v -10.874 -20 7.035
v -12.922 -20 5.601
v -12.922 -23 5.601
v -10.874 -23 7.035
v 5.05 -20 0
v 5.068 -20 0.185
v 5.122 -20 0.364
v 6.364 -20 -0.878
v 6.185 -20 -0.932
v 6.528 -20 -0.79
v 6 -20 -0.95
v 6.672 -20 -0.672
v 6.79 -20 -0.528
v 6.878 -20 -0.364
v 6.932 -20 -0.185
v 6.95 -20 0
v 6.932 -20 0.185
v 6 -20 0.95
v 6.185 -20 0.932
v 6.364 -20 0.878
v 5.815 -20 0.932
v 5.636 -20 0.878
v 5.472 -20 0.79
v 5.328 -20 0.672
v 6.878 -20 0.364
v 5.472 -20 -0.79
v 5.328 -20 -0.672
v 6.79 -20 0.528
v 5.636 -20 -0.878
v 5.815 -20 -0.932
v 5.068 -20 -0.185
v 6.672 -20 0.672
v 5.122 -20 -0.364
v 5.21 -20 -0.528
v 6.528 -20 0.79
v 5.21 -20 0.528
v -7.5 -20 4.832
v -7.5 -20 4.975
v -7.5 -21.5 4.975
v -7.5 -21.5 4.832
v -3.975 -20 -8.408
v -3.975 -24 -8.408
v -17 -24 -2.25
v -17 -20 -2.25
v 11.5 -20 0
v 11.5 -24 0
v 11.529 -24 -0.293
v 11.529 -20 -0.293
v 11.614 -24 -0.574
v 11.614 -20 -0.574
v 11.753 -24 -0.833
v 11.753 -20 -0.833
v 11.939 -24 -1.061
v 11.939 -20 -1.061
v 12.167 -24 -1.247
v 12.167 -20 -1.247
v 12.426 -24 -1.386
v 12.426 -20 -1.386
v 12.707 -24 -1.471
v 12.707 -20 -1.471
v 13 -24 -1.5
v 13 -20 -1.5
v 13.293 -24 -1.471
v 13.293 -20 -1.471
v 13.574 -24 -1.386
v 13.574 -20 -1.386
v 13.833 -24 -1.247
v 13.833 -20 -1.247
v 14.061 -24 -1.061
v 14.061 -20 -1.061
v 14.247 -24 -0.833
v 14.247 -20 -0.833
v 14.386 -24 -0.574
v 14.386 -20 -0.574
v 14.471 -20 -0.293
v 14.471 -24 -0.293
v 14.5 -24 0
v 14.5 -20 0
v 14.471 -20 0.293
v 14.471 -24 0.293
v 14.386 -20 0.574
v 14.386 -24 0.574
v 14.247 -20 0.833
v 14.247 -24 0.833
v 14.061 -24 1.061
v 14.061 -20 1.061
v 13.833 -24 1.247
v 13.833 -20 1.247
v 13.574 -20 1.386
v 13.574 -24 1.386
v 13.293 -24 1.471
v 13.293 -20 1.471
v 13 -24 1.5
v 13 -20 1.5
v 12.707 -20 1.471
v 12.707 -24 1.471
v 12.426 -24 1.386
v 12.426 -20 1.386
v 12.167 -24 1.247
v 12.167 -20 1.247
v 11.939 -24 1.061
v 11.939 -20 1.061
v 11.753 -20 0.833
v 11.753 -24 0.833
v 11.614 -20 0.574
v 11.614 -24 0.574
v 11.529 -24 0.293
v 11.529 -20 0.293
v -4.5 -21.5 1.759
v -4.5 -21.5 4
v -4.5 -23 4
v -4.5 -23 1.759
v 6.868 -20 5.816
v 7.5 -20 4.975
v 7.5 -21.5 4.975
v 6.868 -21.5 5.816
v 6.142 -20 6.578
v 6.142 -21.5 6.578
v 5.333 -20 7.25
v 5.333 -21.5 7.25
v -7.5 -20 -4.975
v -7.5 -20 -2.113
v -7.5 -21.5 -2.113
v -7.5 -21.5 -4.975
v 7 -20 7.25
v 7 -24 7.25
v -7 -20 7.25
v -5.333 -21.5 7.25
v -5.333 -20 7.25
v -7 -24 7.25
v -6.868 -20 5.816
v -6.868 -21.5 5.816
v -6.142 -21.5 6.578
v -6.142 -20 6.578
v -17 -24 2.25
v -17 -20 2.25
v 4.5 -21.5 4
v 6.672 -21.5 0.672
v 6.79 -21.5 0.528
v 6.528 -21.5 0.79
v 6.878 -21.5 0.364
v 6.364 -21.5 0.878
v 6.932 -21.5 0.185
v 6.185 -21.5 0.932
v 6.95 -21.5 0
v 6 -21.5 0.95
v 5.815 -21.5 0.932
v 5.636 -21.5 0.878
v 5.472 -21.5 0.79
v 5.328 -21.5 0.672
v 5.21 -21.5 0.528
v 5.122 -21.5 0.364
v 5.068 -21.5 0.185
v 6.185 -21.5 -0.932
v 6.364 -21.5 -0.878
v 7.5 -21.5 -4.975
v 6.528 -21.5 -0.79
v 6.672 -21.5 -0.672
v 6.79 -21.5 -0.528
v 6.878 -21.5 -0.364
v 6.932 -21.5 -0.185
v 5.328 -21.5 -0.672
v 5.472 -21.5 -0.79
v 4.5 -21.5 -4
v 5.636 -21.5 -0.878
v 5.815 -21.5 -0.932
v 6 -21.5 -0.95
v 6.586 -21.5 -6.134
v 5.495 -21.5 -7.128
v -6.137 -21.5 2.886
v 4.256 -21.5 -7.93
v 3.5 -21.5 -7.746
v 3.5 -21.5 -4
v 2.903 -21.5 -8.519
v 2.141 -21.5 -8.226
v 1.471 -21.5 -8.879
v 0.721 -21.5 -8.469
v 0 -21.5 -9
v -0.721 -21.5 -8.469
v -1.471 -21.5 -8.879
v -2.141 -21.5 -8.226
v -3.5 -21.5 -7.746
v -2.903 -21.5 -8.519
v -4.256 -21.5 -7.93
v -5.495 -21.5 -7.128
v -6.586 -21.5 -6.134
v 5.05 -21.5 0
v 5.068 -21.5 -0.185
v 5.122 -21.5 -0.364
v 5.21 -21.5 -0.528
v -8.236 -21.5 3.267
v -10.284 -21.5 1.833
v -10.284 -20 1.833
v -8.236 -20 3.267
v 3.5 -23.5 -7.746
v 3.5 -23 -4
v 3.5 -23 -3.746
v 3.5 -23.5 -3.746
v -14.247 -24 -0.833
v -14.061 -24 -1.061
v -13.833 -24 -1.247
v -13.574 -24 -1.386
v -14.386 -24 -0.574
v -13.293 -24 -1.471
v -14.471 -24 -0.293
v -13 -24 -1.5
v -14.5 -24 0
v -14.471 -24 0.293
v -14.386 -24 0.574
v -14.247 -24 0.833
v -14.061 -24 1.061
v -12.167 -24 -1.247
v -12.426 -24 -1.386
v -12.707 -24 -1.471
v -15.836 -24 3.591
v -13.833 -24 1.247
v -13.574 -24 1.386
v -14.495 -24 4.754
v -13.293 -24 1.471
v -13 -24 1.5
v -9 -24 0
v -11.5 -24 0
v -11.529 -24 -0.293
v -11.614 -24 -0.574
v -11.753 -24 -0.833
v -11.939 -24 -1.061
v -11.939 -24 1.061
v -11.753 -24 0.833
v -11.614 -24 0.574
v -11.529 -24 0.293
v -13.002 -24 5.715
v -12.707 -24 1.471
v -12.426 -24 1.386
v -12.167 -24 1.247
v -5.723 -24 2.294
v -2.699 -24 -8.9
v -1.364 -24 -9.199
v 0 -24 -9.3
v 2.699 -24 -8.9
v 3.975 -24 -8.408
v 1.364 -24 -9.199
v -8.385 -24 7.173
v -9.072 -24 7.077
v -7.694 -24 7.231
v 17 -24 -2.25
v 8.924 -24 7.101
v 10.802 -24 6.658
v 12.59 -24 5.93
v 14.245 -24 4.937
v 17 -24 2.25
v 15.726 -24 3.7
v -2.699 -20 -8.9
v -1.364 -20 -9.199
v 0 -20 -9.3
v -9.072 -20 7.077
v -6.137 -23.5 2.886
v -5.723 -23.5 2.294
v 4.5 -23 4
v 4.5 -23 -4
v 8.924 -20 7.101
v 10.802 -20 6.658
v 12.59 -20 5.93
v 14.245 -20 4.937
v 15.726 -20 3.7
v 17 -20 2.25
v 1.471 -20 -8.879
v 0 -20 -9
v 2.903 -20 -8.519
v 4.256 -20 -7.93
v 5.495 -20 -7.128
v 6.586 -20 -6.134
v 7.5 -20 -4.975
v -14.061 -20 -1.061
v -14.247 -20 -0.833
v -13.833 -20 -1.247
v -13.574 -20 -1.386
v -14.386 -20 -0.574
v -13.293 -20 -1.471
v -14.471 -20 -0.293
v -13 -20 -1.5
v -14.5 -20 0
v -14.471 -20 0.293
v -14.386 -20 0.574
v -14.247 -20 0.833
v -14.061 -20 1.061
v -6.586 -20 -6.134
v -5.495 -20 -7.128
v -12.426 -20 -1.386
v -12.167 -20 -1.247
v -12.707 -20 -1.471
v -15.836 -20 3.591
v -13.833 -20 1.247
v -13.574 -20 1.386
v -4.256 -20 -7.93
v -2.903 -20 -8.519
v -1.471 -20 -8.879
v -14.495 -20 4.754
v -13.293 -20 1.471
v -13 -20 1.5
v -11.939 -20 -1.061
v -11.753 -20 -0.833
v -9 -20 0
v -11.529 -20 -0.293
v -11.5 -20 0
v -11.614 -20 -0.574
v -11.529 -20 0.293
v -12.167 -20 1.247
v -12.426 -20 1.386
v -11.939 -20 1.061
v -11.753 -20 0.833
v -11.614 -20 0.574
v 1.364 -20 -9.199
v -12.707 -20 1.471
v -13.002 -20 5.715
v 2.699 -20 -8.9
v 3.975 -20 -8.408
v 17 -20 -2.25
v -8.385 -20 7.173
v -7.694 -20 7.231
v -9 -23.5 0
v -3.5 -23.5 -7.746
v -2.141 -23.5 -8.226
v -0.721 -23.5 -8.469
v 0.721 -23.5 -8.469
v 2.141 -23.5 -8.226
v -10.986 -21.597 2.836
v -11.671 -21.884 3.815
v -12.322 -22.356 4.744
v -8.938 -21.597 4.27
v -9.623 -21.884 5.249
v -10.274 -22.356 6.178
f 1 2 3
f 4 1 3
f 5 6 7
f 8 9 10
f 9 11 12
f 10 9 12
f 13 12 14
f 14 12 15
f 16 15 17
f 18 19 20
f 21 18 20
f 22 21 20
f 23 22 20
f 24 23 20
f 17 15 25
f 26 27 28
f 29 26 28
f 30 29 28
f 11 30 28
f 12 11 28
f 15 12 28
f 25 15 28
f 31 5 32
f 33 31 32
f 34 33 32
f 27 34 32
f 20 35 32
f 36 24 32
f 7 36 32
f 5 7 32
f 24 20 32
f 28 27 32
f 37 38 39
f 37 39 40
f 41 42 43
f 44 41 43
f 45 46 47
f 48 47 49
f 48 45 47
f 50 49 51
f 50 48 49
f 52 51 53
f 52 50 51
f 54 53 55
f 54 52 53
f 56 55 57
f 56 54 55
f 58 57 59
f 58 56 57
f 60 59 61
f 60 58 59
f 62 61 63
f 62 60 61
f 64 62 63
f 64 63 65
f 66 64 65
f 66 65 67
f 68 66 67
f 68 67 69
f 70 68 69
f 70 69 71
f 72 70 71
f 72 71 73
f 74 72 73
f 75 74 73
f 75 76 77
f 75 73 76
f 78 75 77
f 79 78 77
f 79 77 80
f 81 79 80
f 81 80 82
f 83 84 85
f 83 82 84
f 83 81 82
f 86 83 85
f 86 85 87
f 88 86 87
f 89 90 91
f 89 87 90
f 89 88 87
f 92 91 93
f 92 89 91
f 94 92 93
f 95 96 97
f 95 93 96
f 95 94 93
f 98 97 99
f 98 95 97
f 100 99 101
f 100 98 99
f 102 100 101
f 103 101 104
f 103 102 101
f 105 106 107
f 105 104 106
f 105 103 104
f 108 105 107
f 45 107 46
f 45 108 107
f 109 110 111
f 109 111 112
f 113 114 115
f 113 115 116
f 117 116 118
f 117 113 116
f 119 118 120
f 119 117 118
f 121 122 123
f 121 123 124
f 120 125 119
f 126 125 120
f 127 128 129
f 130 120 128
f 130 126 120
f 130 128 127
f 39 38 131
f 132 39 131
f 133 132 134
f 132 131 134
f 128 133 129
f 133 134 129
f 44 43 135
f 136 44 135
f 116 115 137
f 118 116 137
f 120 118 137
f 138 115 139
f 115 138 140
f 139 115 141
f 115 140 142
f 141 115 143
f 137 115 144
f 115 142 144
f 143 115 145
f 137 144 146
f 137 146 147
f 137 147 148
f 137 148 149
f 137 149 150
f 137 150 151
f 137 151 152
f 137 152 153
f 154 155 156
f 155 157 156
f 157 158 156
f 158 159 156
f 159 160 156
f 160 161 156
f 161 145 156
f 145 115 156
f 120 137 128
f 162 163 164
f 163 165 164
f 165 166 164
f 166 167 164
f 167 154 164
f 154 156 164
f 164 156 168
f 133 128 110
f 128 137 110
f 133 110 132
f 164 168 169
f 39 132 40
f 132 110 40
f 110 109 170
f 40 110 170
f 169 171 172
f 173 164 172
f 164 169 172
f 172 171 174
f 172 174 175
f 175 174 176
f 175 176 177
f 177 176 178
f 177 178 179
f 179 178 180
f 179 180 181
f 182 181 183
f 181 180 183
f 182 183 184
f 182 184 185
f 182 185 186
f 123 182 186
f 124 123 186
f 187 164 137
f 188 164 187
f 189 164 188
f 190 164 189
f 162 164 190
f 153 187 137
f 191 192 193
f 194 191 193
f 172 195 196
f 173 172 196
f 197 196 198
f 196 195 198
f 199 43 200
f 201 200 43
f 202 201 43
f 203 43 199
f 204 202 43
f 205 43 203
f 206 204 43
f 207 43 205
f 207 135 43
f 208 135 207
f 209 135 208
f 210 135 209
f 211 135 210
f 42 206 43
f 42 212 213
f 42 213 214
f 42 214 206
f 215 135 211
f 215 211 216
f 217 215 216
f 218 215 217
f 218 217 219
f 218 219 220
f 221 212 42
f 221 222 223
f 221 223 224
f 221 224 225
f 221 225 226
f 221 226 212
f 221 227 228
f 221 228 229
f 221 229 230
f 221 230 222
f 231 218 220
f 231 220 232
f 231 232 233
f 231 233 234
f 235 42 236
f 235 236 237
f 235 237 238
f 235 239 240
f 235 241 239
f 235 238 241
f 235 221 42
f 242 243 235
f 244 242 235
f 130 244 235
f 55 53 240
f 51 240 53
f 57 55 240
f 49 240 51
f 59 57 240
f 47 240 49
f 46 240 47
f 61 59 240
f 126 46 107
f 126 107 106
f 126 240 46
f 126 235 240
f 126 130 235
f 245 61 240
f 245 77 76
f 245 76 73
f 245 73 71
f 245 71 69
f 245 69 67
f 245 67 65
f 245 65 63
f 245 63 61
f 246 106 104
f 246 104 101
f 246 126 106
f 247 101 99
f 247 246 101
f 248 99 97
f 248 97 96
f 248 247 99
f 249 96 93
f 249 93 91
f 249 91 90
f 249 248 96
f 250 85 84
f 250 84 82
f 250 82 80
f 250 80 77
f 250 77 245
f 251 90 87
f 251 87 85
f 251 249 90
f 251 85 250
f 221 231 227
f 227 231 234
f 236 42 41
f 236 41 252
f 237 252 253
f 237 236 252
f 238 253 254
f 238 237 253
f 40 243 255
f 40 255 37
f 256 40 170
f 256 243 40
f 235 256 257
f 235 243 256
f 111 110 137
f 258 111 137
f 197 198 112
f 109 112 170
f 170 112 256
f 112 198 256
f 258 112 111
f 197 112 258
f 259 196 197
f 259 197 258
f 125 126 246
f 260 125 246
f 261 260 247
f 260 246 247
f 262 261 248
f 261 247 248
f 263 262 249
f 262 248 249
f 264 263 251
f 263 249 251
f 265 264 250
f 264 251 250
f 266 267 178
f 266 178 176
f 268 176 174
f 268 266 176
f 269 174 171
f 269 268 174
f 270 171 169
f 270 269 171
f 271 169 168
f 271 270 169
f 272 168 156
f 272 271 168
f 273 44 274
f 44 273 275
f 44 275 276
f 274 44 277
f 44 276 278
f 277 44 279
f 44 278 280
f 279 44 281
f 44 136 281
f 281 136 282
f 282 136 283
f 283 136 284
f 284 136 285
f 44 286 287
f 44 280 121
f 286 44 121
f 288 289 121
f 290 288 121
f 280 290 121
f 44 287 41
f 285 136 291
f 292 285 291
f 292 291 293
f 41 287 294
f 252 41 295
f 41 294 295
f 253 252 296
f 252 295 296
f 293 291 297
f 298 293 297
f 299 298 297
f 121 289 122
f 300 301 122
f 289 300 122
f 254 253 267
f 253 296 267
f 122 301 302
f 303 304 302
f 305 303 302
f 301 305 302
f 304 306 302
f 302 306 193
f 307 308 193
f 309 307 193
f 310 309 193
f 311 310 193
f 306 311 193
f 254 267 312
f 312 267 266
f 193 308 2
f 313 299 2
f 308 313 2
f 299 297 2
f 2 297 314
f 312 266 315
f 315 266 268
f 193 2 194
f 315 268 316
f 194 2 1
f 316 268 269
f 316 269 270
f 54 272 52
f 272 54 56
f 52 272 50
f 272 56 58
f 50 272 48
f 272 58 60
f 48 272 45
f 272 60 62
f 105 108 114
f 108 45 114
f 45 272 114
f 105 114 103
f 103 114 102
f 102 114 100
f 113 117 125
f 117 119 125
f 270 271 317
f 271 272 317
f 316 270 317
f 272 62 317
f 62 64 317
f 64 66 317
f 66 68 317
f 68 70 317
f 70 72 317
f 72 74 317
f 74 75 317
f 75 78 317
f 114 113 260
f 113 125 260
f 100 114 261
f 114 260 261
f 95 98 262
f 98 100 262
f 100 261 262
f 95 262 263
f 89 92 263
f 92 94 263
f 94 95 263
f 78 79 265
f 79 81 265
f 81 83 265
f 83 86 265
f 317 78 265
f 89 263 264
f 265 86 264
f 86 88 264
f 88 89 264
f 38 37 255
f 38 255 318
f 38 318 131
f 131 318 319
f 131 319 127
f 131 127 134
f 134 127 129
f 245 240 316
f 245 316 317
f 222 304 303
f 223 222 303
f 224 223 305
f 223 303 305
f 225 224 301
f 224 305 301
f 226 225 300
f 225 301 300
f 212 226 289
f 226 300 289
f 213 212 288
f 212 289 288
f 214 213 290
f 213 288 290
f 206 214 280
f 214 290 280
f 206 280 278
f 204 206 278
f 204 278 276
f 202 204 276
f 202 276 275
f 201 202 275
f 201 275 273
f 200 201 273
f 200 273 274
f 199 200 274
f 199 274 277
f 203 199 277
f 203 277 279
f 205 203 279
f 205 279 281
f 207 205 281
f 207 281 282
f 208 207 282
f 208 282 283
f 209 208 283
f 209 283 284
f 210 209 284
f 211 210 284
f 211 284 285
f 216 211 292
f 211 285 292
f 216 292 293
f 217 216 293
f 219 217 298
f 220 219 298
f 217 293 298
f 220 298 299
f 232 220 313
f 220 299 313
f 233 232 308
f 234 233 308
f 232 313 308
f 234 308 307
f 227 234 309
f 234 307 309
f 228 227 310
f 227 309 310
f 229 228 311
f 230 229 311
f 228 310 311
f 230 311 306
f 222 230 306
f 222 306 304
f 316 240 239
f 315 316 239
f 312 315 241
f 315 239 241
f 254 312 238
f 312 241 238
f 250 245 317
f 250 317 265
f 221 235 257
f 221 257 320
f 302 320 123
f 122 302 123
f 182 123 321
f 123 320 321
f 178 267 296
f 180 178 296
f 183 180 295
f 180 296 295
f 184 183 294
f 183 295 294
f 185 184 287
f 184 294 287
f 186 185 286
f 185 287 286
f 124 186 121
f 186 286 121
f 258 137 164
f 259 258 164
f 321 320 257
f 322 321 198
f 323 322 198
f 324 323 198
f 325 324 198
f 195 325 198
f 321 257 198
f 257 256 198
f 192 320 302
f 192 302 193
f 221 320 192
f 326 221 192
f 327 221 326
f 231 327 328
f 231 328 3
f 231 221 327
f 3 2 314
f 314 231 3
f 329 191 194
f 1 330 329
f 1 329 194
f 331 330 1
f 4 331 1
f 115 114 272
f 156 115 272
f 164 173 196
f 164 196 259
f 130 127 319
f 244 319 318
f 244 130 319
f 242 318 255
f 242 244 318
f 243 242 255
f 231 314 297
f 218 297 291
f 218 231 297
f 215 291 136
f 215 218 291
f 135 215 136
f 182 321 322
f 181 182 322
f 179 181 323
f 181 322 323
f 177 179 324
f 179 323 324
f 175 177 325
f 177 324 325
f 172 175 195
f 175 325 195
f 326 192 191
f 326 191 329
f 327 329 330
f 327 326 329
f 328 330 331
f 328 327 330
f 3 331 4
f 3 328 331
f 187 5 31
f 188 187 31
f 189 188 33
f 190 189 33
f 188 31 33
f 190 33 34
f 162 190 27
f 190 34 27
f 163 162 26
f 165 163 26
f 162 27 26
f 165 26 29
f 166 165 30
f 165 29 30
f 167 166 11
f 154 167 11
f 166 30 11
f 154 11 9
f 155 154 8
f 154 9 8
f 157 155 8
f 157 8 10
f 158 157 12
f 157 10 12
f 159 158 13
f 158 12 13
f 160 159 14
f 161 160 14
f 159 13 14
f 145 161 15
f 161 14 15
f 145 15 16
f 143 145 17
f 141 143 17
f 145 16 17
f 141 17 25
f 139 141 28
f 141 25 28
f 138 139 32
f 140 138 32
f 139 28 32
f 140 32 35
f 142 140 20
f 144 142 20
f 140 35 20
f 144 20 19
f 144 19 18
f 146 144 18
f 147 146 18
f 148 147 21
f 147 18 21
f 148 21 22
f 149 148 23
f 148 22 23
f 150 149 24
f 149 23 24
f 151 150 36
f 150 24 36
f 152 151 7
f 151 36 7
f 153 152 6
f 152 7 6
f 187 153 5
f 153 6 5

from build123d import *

# Parameters (mm, degrees)
PAD096_DEPTH    = 4
SKETCH294_R     = 1.5
POCKET172_DEPTH = 6
SKETCH295_R     = 0.95
POCKET173_DEPTH = 1.5
SKETCH299_W     = 4.5
SKETCH299_H     = 8
POCKET175_DEPTH = 3
POCKET176_DEPTH = 5
POCKET177_DEPTH = 5
PAD107_DEPTH    = 2.5


with BuildPart() as part:
    # Sketch278 → Pad096 (new body)
    with BuildSketch(Plane.XZ.offset(24)):
        with BuildLine():
            Line((-17, -2.25), (-17, 2.25))
            ThreePointArc((-7, 7.25), (-12.5901699437, 5.9303398875), (-17, 2.25))
            Line((-7, 7.25), (0, 7.25))
            Line((0, 7.25), (0, -9.3))
            ThreePointArc((-3.9748544782, -8.4077661645), (-2.0368817676, -9.0742003871), (0, -9.3))
            Line((-3.9748544782, -8.4077661645), (-17, -2.25))
        make_face()
    pad096 = extrude(amount=-PAD096_DEPTH)

    # Sketch294 (on Face8 of Pad096) → Pocket172 (cut)
    with BuildSketch(Plane(origin=(0, -20, 0), x_dir=(1, 0, 0), z_dir=(0, 1, 0))):
        with Locations((-13, 0)):
            Circle(SKETCH294_R)
    pocket172 = extrude(amount=-POCKET172_DEPTH, mode=Mode.SUBTRACT)

    # Sketch295 (on Face5 of Pocket172) → Pocket173 (cut)
    with BuildSketch(Plane(origin=(0, -20, 0), x_dir=(1, 0, 0), z_dir=(0, 1, 0))):
        with BuildLine():
            Line((0, 9), (0, -9))
            ThreePointArc((-7.5, -4.9749371855), (-4.2559114964, -7.9301461106), (0, -9))
            Line((-7.5, -4.9749371855), (-7.5, 4.9749371855))
            ThreePointArc((0, 9), (-4.2559114964, 7.9301461106), (-7.5, 4.9749371855))
        make_face()
        with Locations((-6, 0)):
            Circle(SKETCH295_R, mode=Mode.SUBTRACT)
    pocket173 = extrude(amount=-POCKET173_DEPTH, mode=Mode.SUBTRACT)

    # Sketch299 (on Face5 of Pocket172) → Pocket175 (cut)
    with BuildSketch(Plane(origin=(0, -20, 0), x_dir=(1, 0, 0), z_dir=(0, 1, 0))):
        with Locations((-2.25, 0)):
            Rectangle(SKETCH299_W, SKETCH299_H)
    pocket175 = extrude(amount=-POCKET175_DEPTH, mode=Mode.SUBTRACT)

    # Mirrored012: Pad096, Pocket172, Pocket173, Pocket175 across Sketch278 V_Axis
    add(pad096.mirror(Plane(origin=(0, -24, 0), x_dir=(0, -1, 0), z_dir=(1, 0, 0))))
    add(pocket172.mirror(Plane(origin=(0, -24, 0), x_dir=(0, -1, 0), z_dir=(1, 0, 0))), mode=Mode.SUBTRACT)
    add(pocket173.mirror(Plane(origin=(0, -24, 0), x_dir=(0, -1, 0), z_dir=(1, 0, 0))), mode=Mode.SUBTRACT)
    add(pocket175.mirror(Plane(origin=(0, -24, 0), x_dir=(0, -1, 0), z_dir=(1, 0, 0))), mode=Mode.SUBTRACT)

    # Sketch300 → Pocket176 (cut)
    with BuildSketch(Plane.XZ.offset(24)):
        Polygon((-9, 0), (-13.5886114908, 6.5532163543), (-10.3120033137, 8.8475220997), (-5.7233918228, 2.2943057454), align=None)
    extrude(amount=-POCKET176_DEPTH, mode=Mode.SUBTRACT)

    # Sketch301 → Pocket177 (cut)
    with BuildSketch(Plane.XZ.offset(23.5)):
        with BuildLine():
            ThreePointArc((-3.5, -7.7459666924), (0, -8.5), (3.5, -7.7459666924))
            Line((3.5, -7.7459666924), (3.5, -3.7459666924))
            Line((3.5, -3.7459666924), (-6.7056942546, 3.2766081772))
            Line((-6.7056942546, 3.2766081772), (-9, 0))
            Line((-9, 0), (-3.5, -7.7459666924))
        make_face()
    extrude(amount=-POCKET177_DEPTH, mode=Mode.SUBTRACT)

    # Sketch302 (on Face13 of Pocket177) → Pad107 (join)
    with BuildSketch(Plane(origin=(-6.039090645, 0, -4.2286167935), x_dir=(-0.5735764364, 0, 0.8191520443), z_dir=(0.8191520443, 0, 0.5735764364))):
        with BuildLine():
            Line((12, 20), (12, 23))
            ThreePointArc((7.4, 21.5), (9.8191940807, 21.8844714859), (12, 23))
            Line((7.4, 21.5), (7.4, 20))
            Line((7.4, 20), (12, 20))
        make_face()
    extrude(amount=PAD107_DEPTH)


solid = part.part
